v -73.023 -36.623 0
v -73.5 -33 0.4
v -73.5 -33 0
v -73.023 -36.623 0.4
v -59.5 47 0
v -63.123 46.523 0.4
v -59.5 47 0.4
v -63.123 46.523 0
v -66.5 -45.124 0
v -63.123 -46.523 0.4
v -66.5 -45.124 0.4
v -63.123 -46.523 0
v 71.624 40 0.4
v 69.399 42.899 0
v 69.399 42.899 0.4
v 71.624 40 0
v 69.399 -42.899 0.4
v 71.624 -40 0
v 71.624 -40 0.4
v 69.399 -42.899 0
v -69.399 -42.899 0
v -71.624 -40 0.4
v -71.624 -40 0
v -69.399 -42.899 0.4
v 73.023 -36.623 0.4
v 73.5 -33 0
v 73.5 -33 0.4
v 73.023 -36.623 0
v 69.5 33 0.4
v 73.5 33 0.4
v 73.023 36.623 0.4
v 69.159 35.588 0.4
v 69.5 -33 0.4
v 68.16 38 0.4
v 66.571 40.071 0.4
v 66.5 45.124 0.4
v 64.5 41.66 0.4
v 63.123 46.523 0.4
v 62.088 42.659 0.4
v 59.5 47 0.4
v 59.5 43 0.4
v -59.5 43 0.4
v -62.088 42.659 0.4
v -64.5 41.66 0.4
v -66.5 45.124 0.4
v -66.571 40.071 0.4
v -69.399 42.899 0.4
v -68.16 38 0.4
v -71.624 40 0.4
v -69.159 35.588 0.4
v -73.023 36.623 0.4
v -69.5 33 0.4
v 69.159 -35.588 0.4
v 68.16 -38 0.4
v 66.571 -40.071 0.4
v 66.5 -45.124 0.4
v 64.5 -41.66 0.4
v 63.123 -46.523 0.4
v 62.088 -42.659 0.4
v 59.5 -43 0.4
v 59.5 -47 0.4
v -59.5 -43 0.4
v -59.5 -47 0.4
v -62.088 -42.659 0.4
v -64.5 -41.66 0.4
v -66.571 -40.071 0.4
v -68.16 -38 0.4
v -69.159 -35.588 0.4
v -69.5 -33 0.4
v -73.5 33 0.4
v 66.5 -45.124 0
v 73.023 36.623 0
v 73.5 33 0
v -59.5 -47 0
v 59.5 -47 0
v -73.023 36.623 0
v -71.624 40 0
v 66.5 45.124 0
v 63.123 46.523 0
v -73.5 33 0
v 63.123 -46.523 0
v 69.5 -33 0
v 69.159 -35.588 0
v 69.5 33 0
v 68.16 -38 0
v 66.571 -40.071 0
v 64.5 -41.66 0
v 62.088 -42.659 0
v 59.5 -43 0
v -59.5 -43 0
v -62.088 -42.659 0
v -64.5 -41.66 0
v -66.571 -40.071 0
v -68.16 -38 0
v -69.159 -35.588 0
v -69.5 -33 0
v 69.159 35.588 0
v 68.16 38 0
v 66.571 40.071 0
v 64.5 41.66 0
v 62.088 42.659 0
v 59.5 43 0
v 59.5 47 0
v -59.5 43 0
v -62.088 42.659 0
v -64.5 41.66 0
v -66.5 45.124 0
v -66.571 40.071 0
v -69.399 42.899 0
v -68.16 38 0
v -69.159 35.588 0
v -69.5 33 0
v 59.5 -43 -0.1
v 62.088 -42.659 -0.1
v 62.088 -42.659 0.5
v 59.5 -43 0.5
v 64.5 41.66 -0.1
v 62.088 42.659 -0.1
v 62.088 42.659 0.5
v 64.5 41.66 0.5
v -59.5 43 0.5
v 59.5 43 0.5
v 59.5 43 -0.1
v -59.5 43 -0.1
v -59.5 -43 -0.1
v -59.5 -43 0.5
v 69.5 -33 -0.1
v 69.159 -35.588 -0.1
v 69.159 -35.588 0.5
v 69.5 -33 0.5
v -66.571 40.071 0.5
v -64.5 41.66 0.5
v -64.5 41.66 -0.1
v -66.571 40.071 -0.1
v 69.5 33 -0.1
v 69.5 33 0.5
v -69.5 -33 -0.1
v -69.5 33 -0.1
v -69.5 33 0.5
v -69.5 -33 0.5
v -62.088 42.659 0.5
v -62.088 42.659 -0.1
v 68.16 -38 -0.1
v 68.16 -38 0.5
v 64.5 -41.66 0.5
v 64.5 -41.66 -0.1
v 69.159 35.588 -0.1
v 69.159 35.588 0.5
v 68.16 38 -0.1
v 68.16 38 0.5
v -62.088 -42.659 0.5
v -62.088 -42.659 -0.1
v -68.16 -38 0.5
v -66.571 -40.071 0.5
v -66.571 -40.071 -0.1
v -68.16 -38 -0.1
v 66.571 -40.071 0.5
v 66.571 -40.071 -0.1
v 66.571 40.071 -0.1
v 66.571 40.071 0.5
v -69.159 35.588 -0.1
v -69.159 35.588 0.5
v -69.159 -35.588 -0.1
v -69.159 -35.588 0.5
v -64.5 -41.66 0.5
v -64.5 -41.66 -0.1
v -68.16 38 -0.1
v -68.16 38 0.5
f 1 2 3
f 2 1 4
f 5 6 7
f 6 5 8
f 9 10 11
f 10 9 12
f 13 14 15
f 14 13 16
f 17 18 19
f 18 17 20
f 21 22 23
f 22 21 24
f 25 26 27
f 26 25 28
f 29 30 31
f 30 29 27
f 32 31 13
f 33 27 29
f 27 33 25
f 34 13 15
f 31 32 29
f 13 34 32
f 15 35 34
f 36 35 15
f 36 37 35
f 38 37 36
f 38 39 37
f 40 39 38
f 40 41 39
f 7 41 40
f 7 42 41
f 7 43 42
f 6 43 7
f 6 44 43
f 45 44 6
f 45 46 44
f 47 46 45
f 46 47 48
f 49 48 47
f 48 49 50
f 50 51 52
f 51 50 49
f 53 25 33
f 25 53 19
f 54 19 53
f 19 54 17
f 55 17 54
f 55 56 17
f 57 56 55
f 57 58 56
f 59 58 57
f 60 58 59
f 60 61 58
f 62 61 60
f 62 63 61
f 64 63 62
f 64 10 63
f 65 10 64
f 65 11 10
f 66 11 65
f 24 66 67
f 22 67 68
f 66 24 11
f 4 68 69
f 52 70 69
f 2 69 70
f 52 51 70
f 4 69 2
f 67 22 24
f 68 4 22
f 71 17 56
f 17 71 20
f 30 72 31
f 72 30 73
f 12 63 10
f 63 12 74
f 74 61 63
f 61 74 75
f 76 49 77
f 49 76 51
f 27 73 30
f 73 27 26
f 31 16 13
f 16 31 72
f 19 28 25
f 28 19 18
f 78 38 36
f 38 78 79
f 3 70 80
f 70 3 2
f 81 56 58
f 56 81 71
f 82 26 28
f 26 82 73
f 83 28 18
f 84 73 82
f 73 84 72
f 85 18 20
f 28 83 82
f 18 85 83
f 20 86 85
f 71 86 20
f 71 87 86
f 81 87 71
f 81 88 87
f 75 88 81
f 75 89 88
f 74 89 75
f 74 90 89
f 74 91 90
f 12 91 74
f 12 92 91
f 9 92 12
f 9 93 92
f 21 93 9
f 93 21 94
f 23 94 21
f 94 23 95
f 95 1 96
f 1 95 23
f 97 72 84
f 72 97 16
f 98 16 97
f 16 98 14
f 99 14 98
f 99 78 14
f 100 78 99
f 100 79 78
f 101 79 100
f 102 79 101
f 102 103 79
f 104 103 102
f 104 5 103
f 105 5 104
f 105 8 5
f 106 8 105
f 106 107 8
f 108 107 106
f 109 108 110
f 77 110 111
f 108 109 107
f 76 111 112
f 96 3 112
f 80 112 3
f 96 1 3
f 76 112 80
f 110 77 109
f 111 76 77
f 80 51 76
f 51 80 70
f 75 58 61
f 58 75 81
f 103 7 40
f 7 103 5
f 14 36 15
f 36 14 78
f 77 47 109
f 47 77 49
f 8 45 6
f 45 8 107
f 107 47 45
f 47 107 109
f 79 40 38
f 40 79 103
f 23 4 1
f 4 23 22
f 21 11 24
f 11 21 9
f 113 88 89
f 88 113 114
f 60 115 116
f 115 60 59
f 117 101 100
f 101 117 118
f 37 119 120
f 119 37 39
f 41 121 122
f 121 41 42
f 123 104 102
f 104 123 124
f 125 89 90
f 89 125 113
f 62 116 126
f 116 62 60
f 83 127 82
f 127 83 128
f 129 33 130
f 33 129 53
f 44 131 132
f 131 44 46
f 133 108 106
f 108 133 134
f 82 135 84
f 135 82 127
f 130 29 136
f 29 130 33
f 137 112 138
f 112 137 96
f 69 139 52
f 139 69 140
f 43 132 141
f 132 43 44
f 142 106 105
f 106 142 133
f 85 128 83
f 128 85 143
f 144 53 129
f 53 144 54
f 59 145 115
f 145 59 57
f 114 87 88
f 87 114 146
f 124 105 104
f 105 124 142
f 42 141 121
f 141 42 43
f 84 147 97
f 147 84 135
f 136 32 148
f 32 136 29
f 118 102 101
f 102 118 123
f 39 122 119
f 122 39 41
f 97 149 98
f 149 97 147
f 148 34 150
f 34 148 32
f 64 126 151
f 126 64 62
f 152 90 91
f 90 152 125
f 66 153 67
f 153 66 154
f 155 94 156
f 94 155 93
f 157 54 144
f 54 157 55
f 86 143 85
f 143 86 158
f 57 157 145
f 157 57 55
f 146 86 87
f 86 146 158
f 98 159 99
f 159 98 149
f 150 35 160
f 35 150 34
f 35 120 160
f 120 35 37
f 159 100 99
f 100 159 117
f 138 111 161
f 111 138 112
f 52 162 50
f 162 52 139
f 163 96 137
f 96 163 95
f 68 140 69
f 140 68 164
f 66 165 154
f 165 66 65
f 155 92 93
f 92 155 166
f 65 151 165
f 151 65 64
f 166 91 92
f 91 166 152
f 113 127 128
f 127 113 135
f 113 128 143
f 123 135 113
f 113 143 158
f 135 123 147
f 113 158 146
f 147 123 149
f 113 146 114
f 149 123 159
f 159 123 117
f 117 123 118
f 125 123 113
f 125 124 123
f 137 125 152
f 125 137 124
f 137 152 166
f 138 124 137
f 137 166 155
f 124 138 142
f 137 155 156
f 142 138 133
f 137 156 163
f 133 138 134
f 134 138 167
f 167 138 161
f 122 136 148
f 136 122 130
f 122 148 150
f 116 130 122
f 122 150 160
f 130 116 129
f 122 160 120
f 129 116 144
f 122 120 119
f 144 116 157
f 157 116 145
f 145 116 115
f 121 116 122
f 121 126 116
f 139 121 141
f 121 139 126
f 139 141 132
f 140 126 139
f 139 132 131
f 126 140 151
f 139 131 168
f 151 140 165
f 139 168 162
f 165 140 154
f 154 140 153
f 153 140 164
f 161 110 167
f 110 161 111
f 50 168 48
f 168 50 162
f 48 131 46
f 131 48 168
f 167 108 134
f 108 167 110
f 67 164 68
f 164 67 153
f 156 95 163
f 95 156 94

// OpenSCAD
// file: ../OpenSCAD_Modules/cube_vround.scad
module cube_vround(
	size=[10,10,10],
	round_corners=[true,true,true,true],
	rounding=3,
	center_xy=false,
	center_z=false,
	attach=0,
	wall_attach=0,
	quality=2, //integer from 1 to infinity
)
{
	assert(len(size)==3);
	assert(len(round_corners)==4);
	assert(rounding>0);
	assert(rounding<=size[0]/2);
	assert(rounding<=size[1]/2);
	assert(quality>0);
	assert(attach>=0);
	assert(wall_attach>=0);
	height=size[2]+attach;
	cyl_r=rounding+wall_attach;
	cyl_mvx=size[0]/2-rounding;
	cyl_mvy=size[1]/2-rounding;
	cube_szx=size[0]/2;
	cube_szy=size[1]/2;
	cube_mvx=cube_szx/2+wall_attach;
	cube_mvy=cube_szy/2+wall_attach;
	translate([center_xy?0:cube_szx,center_xy?0:cube_szy,center_z?-attach/2:(size[2]-attach)/2])
		hull()
		{
			if(round_corners[0])
				translate([cyl_mvx,cyl_mvy])
					cylinder(r=cyl_r,h=height,$fn=12*quality,center=true);
			else
				translate([cube_mvx,cube_mvy])
					cube([cube_szx,cube_szy,height],center=true);
			if(round_corners[1])
				translate([cyl_mvx,-cyl_mvy])
					cylinder(r=cyl_r,h=height,$fn=12*quality,center=true);
			else
				translate([cube_mvx,-cube_mvy])
					cube([cube_szx,cube_szy,height],center=true);
			if(round_corners[2])
				translate([-cyl_mvx,-cyl_mvy])
					cylinder(r=cyl_r,h=height,$fn=12*quality,center=true);
			else
				translate([-cube_mvx,-cube_mvy])
					cube([cube_szx,cube_szy,height],center=true);
			if(round_corners[3])
				translate([-cyl_mvx,cyl_mvy])
					cylinder(r=cyl_r,h=height,$fn=12*quality,center=true);
			else
				translate([-cube_mvx,cube_mvy])
					cube([cube_szx,cube_szy,height],center=true);
		};
}

//example
cube_vround(round_corners=[true,false,true,false],
size=[10,20,6],
attach=0.1,
wall_attach=0.1,
rounding=3,
center_xy=true,center_z=false);
// main file
use <../OpenSCAD_Modules/cube_vround.scad>

module fan_shroud_1 (
	quality=2, //integer from 1 to infinity
)
{
	cube_vround(
		size=[147,77,0.4],
		rounding=10+4,
		attach=0,
		center_xy=true,quality=quality);
}

module fan_shroud_1_cut (
	quality=2, //integer from 1 to infinity
)
{
	color([0.5,0.5,0.5])
		cube_vround(
		size=[147-4*2,77-4*2,0.5],
		rounding=10,
		attach=0.1,
		center_xy=true,quality=quality);
}

module fan_shroud_2 (
	quality=2, //integer from 1 to infinity
)
{
	cube_vround(
		size=[147,94,0.4],
		rounding=10+4,
		attach=0,
		center_xy=true,quality=quality);
}

module fan_shroud_2_cut (
	quality=2, //integer from 1 to infinity
)
{
	color([0.5,0.5,0.5])
		cube_vround(
		size=[147-4*2,94-4*2,0.5],
		rounding=10,
		attach=0.1,
		center_xy=true,quality=quality);
}

//fan_shroud_1();
//fan_shroud_1_cut();

fan_shroud_2();
fan_shroud_2_cut();
